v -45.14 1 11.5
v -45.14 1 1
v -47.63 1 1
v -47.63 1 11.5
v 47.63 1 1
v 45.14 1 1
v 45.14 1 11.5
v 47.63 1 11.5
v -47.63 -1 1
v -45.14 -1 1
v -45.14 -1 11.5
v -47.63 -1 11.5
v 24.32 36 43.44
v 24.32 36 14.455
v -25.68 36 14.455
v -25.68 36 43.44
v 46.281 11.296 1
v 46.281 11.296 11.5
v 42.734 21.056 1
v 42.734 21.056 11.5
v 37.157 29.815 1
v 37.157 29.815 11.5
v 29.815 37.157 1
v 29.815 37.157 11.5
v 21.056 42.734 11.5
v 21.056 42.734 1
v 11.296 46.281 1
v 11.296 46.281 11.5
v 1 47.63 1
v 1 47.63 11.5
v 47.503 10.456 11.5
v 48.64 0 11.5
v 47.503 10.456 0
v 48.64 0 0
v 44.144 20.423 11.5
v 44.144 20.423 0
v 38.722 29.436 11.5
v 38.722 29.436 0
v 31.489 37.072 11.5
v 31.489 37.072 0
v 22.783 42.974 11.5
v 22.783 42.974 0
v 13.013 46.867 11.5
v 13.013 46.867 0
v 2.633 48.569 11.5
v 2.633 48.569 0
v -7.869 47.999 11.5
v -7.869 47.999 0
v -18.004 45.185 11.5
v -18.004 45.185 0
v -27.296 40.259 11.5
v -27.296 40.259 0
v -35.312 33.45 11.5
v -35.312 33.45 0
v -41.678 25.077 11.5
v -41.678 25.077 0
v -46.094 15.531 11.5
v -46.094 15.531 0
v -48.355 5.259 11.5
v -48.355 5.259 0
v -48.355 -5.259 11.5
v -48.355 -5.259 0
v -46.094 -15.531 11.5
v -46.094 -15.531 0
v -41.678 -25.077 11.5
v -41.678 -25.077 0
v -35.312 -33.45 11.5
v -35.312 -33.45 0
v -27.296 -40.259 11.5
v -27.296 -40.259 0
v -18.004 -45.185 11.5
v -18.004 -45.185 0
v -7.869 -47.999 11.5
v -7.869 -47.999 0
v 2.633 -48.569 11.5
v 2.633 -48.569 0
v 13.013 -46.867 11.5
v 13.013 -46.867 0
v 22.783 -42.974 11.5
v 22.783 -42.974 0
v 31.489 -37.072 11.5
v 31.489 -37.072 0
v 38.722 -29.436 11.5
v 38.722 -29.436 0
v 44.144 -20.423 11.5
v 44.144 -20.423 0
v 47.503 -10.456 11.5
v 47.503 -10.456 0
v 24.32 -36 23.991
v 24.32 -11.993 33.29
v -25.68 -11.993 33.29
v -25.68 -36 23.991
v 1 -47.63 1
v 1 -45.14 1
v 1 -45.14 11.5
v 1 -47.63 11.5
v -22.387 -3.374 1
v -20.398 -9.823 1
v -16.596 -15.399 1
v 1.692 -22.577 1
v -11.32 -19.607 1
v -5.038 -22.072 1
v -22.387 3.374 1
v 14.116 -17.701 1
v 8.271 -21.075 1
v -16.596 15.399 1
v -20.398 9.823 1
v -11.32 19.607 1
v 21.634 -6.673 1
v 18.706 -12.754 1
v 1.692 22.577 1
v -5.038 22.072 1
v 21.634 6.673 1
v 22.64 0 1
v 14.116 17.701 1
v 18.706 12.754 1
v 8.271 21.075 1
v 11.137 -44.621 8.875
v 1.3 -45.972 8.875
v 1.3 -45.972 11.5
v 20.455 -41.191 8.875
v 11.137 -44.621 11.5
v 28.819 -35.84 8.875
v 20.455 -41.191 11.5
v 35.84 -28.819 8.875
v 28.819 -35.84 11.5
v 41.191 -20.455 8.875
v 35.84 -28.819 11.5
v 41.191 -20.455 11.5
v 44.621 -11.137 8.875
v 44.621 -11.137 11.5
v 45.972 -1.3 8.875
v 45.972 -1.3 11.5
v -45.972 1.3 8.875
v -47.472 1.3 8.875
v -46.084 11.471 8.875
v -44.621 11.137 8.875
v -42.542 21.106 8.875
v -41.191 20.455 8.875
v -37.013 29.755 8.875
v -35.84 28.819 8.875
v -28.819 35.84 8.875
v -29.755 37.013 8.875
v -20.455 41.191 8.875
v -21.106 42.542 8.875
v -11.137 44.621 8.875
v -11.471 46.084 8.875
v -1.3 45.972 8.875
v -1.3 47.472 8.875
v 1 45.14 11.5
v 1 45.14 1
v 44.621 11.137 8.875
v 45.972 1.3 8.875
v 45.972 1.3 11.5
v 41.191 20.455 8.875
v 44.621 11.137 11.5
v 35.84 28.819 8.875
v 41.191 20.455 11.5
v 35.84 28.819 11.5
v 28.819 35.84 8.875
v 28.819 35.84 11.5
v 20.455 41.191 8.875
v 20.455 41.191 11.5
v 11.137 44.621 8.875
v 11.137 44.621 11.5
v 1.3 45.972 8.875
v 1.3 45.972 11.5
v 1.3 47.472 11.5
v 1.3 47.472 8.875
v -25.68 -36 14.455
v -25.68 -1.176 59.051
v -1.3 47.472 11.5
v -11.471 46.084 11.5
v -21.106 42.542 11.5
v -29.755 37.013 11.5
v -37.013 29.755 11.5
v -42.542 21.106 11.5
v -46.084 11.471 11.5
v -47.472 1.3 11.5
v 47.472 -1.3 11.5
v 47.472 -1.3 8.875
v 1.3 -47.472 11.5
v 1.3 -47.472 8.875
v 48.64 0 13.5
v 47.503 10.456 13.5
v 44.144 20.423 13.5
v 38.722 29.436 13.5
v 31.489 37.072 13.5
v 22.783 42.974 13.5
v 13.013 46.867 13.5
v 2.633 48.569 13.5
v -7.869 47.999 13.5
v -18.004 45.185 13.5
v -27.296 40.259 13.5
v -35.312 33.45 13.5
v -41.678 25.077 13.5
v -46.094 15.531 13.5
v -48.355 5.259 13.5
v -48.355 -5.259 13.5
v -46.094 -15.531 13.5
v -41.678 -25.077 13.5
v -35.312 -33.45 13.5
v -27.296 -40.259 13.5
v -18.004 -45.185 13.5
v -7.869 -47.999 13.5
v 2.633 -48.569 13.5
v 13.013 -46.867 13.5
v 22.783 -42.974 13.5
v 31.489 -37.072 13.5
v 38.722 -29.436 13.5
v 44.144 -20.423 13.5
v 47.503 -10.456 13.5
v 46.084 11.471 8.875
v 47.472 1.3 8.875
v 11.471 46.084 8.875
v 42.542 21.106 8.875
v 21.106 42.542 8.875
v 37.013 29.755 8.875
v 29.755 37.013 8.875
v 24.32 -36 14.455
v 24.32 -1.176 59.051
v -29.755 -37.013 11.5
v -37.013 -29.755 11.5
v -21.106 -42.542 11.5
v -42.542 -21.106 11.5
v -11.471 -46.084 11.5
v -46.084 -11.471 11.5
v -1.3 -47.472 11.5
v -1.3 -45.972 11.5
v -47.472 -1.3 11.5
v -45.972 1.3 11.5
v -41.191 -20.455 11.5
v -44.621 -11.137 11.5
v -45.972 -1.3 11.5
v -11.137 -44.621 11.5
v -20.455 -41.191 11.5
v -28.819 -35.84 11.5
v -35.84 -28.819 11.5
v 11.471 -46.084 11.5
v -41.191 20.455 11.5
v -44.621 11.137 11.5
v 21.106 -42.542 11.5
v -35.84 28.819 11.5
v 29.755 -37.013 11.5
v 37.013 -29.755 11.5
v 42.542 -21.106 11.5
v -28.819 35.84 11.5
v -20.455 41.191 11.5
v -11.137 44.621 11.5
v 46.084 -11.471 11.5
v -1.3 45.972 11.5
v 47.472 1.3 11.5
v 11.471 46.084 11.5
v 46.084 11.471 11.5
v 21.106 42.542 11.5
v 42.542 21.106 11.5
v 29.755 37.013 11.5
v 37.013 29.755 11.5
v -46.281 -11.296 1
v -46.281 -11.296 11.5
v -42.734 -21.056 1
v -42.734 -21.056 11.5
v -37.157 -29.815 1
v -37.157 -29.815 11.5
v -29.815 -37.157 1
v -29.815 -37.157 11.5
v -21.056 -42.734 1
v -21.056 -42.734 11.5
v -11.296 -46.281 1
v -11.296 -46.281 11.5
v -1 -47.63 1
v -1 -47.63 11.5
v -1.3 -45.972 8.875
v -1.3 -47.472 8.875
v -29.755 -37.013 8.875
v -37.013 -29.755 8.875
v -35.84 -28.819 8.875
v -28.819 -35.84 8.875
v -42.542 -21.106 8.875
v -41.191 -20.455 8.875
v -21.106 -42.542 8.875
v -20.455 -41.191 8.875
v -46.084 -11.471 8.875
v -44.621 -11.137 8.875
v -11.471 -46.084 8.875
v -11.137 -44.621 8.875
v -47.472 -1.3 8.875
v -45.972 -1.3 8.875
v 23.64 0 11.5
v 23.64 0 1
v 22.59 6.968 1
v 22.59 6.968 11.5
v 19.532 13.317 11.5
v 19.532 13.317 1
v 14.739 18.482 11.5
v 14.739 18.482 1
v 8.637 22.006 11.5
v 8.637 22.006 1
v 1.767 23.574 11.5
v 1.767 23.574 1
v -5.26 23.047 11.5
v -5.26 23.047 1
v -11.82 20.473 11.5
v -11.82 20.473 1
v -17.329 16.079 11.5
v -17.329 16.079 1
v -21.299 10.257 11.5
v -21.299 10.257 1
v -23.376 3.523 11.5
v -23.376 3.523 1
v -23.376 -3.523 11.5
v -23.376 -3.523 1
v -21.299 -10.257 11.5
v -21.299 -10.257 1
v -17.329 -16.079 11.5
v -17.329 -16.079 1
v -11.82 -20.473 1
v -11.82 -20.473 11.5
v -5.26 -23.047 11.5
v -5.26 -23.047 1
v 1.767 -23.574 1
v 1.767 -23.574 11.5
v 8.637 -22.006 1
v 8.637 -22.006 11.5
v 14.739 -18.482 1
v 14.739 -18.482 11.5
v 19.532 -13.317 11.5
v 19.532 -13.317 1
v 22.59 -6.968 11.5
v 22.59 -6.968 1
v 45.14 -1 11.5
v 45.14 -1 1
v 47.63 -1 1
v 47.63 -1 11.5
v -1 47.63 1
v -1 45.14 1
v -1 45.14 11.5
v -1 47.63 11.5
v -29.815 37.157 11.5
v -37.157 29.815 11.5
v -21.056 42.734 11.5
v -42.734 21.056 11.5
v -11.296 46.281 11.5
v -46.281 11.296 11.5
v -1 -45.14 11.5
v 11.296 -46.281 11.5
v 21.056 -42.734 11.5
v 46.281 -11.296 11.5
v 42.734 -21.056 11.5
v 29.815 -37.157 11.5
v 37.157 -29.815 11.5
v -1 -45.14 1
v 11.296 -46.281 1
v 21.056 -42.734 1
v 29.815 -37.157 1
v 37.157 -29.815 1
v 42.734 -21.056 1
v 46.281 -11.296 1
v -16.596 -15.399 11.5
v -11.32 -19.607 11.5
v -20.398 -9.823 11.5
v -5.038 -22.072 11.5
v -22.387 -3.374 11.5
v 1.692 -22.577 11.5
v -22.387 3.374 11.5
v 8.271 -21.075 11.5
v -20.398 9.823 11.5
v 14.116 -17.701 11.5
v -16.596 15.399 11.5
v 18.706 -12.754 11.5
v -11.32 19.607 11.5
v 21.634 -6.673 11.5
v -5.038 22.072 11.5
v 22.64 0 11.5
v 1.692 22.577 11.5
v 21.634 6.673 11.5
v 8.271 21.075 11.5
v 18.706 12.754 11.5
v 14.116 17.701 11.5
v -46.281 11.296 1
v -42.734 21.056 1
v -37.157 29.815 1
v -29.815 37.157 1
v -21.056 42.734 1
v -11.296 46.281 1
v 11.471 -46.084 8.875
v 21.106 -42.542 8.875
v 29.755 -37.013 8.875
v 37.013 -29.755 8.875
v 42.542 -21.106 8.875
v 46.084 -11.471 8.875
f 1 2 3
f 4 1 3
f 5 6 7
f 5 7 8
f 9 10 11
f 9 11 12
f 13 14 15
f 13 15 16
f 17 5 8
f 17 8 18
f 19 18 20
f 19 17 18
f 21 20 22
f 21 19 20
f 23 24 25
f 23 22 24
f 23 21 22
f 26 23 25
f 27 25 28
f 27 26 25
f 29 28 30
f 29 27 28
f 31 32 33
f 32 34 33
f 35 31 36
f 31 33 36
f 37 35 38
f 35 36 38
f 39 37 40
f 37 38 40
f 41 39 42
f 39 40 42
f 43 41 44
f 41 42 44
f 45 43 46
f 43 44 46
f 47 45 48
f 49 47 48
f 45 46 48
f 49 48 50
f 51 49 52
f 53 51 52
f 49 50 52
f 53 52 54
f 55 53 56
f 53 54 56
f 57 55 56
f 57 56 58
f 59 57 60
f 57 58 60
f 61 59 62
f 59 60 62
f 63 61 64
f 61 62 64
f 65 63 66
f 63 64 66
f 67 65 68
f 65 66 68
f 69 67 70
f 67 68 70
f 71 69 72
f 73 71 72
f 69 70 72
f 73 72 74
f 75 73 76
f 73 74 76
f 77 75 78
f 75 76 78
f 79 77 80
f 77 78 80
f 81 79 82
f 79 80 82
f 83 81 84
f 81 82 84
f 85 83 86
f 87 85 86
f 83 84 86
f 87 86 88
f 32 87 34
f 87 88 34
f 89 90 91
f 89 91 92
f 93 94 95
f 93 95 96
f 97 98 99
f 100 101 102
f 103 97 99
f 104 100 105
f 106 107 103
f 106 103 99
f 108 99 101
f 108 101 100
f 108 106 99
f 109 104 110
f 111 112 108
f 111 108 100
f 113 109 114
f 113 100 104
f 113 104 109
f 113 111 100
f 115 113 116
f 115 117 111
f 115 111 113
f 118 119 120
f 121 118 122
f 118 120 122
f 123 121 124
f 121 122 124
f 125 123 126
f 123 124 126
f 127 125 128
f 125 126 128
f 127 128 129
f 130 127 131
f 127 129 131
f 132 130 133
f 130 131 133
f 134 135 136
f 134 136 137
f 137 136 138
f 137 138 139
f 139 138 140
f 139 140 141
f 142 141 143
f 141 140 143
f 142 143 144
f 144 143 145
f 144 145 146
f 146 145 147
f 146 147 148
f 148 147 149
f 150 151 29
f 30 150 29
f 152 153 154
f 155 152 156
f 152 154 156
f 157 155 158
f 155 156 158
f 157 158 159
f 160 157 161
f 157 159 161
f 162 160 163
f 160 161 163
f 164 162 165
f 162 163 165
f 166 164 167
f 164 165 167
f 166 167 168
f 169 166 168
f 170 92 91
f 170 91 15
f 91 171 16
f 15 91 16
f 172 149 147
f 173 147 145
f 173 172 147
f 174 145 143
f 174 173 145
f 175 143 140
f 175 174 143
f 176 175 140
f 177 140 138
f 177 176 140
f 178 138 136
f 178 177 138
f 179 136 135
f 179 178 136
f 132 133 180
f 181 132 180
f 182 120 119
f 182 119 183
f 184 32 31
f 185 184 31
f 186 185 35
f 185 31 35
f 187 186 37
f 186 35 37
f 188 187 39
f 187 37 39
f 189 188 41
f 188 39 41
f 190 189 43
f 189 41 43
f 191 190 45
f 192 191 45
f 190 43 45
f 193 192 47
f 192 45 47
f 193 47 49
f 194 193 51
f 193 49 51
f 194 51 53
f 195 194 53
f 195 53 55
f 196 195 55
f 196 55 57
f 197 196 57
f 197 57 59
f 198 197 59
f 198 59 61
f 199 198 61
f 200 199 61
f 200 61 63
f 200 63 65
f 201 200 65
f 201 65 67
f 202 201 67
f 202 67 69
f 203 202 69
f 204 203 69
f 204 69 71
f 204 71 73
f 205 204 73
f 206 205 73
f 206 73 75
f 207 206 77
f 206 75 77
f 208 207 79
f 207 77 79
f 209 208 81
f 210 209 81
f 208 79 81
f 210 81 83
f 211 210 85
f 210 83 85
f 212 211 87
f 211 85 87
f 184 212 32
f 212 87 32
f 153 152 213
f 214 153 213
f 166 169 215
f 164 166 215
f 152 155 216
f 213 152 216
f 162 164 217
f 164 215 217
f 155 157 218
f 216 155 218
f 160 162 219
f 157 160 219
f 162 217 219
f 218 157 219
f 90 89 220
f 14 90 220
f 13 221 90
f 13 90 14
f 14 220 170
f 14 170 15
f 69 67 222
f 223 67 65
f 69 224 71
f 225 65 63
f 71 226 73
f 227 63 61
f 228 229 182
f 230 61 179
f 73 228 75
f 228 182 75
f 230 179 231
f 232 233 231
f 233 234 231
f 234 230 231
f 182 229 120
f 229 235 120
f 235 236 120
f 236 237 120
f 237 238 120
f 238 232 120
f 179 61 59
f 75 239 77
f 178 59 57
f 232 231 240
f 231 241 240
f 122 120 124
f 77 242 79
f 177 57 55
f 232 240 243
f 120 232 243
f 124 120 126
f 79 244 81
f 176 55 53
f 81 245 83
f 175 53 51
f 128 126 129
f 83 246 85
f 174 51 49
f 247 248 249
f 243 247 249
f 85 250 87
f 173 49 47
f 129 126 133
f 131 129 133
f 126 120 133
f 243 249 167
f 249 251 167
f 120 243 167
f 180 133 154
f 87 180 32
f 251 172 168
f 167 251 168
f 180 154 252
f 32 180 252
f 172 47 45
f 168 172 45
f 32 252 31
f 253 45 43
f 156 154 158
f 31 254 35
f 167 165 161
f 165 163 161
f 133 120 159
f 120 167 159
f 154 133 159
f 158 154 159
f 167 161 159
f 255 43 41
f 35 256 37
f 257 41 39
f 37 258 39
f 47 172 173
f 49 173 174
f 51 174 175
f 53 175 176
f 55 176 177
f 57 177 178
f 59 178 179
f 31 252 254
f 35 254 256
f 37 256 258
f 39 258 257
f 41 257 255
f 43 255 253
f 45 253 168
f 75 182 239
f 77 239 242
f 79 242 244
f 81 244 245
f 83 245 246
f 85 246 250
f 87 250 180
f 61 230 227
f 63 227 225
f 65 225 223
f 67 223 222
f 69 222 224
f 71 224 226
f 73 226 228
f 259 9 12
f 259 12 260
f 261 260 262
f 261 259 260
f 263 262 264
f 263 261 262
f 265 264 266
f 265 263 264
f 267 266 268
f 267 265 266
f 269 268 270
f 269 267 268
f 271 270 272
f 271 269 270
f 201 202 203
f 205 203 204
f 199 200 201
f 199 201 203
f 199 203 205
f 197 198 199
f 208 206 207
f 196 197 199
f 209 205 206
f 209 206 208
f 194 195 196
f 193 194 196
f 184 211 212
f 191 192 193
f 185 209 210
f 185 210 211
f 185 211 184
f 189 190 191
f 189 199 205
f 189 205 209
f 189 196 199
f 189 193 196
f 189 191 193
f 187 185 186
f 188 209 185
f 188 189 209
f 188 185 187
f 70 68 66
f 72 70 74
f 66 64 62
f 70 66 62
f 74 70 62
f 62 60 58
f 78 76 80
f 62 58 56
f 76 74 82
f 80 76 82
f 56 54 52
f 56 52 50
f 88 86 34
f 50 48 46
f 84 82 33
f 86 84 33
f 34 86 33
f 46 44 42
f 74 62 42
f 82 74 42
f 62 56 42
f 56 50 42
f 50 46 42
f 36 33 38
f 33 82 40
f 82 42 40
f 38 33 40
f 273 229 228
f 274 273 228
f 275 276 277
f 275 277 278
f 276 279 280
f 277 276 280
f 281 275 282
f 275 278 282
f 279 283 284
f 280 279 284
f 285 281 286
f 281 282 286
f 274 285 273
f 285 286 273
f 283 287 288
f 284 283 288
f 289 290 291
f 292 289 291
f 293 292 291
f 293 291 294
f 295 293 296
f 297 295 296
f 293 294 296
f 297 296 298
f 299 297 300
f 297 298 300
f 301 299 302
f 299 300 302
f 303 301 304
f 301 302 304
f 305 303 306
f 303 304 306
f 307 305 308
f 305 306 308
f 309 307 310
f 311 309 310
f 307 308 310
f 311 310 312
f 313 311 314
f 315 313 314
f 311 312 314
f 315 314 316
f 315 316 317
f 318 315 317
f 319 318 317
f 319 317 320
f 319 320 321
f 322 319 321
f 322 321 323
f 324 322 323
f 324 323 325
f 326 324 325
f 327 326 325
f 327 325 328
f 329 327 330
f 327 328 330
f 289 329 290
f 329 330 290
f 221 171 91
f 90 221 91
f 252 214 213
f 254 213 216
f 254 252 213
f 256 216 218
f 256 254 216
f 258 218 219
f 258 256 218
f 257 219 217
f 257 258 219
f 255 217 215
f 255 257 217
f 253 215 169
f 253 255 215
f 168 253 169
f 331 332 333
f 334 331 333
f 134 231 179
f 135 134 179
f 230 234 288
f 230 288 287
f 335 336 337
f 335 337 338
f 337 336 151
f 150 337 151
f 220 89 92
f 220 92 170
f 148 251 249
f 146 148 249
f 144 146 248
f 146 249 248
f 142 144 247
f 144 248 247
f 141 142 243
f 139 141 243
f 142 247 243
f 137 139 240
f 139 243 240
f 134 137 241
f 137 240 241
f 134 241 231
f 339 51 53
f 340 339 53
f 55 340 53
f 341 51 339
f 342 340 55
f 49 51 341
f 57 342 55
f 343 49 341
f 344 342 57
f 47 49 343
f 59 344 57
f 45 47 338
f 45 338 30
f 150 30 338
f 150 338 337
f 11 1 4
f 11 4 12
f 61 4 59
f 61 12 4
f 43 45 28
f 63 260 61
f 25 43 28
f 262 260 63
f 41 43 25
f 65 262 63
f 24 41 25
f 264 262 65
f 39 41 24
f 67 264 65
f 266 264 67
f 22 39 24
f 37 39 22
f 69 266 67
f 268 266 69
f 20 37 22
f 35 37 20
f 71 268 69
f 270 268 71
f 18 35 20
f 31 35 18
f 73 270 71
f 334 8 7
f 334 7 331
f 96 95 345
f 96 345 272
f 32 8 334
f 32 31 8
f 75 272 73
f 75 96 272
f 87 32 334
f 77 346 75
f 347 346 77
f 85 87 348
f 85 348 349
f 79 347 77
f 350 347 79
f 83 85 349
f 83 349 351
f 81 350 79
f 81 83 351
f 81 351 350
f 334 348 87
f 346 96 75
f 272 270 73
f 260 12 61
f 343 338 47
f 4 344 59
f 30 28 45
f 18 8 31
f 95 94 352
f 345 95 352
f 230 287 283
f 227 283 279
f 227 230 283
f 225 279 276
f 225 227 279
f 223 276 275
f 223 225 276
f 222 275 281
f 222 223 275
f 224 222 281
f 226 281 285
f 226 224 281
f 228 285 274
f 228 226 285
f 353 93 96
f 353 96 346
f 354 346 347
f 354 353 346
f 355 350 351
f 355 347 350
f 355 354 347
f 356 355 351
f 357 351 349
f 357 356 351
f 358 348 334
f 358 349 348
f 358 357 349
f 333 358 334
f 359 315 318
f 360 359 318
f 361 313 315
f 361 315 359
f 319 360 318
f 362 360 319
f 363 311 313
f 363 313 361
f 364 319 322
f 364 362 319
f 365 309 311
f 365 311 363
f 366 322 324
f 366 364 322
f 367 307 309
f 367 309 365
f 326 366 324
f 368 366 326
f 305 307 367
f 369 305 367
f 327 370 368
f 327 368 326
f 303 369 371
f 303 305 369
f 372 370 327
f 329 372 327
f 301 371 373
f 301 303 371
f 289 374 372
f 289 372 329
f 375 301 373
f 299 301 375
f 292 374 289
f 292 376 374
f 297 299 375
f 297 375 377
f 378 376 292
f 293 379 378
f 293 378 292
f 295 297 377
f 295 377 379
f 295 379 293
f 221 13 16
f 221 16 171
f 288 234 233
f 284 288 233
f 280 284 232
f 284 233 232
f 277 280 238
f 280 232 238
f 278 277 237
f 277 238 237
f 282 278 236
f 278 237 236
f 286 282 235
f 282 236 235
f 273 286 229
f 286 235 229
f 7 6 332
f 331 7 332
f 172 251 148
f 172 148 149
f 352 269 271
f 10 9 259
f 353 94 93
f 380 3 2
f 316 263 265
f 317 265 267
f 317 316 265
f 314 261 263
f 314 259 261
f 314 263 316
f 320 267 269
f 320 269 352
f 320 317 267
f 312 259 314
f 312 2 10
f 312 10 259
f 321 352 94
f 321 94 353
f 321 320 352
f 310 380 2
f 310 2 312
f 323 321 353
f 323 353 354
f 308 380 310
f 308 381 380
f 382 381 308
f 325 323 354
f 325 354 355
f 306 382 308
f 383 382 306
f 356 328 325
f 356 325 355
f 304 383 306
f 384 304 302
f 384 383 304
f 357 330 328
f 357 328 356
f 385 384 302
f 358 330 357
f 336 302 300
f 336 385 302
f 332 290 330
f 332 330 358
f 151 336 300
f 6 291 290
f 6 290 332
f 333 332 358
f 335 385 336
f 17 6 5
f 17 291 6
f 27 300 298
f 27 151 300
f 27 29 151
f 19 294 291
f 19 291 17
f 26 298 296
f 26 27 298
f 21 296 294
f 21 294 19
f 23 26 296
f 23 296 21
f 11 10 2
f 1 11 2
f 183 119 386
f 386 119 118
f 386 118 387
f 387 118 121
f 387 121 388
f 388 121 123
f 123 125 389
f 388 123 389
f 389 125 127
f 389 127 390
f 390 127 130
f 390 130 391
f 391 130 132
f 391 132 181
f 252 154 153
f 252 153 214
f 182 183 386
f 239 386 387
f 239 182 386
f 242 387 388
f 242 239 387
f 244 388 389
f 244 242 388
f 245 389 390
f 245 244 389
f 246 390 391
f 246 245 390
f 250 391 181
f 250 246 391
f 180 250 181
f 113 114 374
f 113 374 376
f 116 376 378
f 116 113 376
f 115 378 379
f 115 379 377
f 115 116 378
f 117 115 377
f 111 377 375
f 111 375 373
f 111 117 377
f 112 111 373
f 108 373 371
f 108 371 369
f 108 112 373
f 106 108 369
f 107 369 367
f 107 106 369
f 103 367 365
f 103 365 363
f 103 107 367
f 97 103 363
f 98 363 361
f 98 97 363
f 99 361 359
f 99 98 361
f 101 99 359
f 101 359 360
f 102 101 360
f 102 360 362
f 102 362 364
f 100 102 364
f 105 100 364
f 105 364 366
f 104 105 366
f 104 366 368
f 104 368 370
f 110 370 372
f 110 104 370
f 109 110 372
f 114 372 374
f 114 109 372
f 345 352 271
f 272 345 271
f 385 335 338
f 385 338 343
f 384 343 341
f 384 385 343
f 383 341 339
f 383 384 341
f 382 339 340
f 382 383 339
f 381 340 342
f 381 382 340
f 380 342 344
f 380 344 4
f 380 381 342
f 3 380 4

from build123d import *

# Parameters (mm, degrees)
SKETCH_R              = 48.64
PAD_DEPTH             = 1
SKETCH001_R           = 48.64
SKETCH001_R_2         = 47.64
PAD001_DEPTH          = 10.5
SKETCH002_R           = 23.64
SKETCH002_R_2         = 22.64
PAD002_DEPTH          = 10.5
SKETCH003_W           = 2
SKETCH003_H           = 2.5
PAD003_DEPTH          = 10.5
POLARPATTERN_COUNT    = 4
SKETCH004_R           = 48.64
PAD004_DEPTH          = 2
SKETCH005_R           = 47.49
SKETCH005_R_2         = 45.99
PAD005_DEPTH          = 2.625
SKETCH006_W           = 2.6
SKETCH006_H           = 6
POCKET_DEPTH          = 5.25
POLARPATTERN001_COUNT = 4
PAD006_DEPTH          = 50


with BuildPart() as led_base:
    # Sketch → Pad (new body)
    with BuildSketch(Plane.XY):
        Circle(SKETCH_R)
    extrude(amount=PAD_DEPTH)

    # Sketch001 (on DatumPlane) → Pad001 (join)
    with BuildSketch(Plane.XY.offset(1)):
        Circle(SKETCH001_R)
        Circle(SKETCH001_R_2, mode=Mode.SUBTRACT)
    extrude(amount=PAD001_DEPTH)

    # Sketch002 (on DatumPlane) → Pad002 (join)
    with BuildSketch(Plane.XY.offset(1)):
        Circle(SKETCH002_R)
        Circle(SKETCH002_R_2, mode=Mode.SUBTRACT)
    extrude(amount=PAD002_DEPTH)

    # Sketch003 (on DatumPlane) → Pad003 (join)
    with BuildSketch(Plane.XY.offset(11.5)):
        with Locations((0, 46.39)):
            Rectangle(SKETCH003_W, SKETCH003_H)
    pad003 = extrude(amount=-PAD003_DEPTH)

    # PolarPattern: Pad003 ×4 about axis
    polarpattern_axis = Axis((0, 0, 11.5), (0, 0, 1))
    for i in range(1, POLARPATTERN_COUNT):
        add(pad003.rotate(polarpattern_axis, i * 360 / POLARPATTERN_COUNT))


with BuildPart() as led_lid:
    # Sketch004 (on DatumPlane) → Pad004 (new body)
    with BuildSketch(Plane.XY.offset(11.5)):
        Circle(SKETCH004_R)
    extrude(amount=PAD004_DEPTH)

    # Sketch005 (on DatumPlane) → Pad005 (join)
    with BuildSketch(Plane.XY.offset(11.5)):
        Circle(SKETCH005_R)
        Circle(SKETCH005_R_2, mode=Mode.SUBTRACT)
    extrude(amount=-PAD005_DEPTH)

    # Sketch006 (on DatumPlane) → Pocket (cut)
    with BuildSketch(Plane.XY.offset(11.5)):
        with Locations((0, 45.64)):
            Rectangle(SKETCH006_W, SKETCH006_H)
    pocket = extrude(amount=-POCKET_DEPTH, mode=Mode.SUBTRACT)

    # PolarPattern001: Pocket ×4 about axis
    polarpattern001_axis = Axis((0, 0, 11.5), (0, 0, 1))
    for i in range(1, POLARPATTERN001_COUNT):
        add(pocket.rotate(polarpattern001_axis, i * 360 / POLARPATTERN001_COUNT), mode=Mode.SUBTRACT)


with BuildPart() as skeleton:
    # Sketch007 (on DatumPlane) → Pad006 (new body)
    with BuildSketch(Plane.YZ.offset(24.32)):
        Polygon((-1.175629, 59.051144), (-11.993196, 33.290246), (-36, 23.991273), (-36, 14.455187), (36, 14.455187), (36, 43.440281), align=None)
    extrude(amount=-PAD006_DEPTH)


solid = Compound([led_base.part, led_lid.part, skeleton.part])
